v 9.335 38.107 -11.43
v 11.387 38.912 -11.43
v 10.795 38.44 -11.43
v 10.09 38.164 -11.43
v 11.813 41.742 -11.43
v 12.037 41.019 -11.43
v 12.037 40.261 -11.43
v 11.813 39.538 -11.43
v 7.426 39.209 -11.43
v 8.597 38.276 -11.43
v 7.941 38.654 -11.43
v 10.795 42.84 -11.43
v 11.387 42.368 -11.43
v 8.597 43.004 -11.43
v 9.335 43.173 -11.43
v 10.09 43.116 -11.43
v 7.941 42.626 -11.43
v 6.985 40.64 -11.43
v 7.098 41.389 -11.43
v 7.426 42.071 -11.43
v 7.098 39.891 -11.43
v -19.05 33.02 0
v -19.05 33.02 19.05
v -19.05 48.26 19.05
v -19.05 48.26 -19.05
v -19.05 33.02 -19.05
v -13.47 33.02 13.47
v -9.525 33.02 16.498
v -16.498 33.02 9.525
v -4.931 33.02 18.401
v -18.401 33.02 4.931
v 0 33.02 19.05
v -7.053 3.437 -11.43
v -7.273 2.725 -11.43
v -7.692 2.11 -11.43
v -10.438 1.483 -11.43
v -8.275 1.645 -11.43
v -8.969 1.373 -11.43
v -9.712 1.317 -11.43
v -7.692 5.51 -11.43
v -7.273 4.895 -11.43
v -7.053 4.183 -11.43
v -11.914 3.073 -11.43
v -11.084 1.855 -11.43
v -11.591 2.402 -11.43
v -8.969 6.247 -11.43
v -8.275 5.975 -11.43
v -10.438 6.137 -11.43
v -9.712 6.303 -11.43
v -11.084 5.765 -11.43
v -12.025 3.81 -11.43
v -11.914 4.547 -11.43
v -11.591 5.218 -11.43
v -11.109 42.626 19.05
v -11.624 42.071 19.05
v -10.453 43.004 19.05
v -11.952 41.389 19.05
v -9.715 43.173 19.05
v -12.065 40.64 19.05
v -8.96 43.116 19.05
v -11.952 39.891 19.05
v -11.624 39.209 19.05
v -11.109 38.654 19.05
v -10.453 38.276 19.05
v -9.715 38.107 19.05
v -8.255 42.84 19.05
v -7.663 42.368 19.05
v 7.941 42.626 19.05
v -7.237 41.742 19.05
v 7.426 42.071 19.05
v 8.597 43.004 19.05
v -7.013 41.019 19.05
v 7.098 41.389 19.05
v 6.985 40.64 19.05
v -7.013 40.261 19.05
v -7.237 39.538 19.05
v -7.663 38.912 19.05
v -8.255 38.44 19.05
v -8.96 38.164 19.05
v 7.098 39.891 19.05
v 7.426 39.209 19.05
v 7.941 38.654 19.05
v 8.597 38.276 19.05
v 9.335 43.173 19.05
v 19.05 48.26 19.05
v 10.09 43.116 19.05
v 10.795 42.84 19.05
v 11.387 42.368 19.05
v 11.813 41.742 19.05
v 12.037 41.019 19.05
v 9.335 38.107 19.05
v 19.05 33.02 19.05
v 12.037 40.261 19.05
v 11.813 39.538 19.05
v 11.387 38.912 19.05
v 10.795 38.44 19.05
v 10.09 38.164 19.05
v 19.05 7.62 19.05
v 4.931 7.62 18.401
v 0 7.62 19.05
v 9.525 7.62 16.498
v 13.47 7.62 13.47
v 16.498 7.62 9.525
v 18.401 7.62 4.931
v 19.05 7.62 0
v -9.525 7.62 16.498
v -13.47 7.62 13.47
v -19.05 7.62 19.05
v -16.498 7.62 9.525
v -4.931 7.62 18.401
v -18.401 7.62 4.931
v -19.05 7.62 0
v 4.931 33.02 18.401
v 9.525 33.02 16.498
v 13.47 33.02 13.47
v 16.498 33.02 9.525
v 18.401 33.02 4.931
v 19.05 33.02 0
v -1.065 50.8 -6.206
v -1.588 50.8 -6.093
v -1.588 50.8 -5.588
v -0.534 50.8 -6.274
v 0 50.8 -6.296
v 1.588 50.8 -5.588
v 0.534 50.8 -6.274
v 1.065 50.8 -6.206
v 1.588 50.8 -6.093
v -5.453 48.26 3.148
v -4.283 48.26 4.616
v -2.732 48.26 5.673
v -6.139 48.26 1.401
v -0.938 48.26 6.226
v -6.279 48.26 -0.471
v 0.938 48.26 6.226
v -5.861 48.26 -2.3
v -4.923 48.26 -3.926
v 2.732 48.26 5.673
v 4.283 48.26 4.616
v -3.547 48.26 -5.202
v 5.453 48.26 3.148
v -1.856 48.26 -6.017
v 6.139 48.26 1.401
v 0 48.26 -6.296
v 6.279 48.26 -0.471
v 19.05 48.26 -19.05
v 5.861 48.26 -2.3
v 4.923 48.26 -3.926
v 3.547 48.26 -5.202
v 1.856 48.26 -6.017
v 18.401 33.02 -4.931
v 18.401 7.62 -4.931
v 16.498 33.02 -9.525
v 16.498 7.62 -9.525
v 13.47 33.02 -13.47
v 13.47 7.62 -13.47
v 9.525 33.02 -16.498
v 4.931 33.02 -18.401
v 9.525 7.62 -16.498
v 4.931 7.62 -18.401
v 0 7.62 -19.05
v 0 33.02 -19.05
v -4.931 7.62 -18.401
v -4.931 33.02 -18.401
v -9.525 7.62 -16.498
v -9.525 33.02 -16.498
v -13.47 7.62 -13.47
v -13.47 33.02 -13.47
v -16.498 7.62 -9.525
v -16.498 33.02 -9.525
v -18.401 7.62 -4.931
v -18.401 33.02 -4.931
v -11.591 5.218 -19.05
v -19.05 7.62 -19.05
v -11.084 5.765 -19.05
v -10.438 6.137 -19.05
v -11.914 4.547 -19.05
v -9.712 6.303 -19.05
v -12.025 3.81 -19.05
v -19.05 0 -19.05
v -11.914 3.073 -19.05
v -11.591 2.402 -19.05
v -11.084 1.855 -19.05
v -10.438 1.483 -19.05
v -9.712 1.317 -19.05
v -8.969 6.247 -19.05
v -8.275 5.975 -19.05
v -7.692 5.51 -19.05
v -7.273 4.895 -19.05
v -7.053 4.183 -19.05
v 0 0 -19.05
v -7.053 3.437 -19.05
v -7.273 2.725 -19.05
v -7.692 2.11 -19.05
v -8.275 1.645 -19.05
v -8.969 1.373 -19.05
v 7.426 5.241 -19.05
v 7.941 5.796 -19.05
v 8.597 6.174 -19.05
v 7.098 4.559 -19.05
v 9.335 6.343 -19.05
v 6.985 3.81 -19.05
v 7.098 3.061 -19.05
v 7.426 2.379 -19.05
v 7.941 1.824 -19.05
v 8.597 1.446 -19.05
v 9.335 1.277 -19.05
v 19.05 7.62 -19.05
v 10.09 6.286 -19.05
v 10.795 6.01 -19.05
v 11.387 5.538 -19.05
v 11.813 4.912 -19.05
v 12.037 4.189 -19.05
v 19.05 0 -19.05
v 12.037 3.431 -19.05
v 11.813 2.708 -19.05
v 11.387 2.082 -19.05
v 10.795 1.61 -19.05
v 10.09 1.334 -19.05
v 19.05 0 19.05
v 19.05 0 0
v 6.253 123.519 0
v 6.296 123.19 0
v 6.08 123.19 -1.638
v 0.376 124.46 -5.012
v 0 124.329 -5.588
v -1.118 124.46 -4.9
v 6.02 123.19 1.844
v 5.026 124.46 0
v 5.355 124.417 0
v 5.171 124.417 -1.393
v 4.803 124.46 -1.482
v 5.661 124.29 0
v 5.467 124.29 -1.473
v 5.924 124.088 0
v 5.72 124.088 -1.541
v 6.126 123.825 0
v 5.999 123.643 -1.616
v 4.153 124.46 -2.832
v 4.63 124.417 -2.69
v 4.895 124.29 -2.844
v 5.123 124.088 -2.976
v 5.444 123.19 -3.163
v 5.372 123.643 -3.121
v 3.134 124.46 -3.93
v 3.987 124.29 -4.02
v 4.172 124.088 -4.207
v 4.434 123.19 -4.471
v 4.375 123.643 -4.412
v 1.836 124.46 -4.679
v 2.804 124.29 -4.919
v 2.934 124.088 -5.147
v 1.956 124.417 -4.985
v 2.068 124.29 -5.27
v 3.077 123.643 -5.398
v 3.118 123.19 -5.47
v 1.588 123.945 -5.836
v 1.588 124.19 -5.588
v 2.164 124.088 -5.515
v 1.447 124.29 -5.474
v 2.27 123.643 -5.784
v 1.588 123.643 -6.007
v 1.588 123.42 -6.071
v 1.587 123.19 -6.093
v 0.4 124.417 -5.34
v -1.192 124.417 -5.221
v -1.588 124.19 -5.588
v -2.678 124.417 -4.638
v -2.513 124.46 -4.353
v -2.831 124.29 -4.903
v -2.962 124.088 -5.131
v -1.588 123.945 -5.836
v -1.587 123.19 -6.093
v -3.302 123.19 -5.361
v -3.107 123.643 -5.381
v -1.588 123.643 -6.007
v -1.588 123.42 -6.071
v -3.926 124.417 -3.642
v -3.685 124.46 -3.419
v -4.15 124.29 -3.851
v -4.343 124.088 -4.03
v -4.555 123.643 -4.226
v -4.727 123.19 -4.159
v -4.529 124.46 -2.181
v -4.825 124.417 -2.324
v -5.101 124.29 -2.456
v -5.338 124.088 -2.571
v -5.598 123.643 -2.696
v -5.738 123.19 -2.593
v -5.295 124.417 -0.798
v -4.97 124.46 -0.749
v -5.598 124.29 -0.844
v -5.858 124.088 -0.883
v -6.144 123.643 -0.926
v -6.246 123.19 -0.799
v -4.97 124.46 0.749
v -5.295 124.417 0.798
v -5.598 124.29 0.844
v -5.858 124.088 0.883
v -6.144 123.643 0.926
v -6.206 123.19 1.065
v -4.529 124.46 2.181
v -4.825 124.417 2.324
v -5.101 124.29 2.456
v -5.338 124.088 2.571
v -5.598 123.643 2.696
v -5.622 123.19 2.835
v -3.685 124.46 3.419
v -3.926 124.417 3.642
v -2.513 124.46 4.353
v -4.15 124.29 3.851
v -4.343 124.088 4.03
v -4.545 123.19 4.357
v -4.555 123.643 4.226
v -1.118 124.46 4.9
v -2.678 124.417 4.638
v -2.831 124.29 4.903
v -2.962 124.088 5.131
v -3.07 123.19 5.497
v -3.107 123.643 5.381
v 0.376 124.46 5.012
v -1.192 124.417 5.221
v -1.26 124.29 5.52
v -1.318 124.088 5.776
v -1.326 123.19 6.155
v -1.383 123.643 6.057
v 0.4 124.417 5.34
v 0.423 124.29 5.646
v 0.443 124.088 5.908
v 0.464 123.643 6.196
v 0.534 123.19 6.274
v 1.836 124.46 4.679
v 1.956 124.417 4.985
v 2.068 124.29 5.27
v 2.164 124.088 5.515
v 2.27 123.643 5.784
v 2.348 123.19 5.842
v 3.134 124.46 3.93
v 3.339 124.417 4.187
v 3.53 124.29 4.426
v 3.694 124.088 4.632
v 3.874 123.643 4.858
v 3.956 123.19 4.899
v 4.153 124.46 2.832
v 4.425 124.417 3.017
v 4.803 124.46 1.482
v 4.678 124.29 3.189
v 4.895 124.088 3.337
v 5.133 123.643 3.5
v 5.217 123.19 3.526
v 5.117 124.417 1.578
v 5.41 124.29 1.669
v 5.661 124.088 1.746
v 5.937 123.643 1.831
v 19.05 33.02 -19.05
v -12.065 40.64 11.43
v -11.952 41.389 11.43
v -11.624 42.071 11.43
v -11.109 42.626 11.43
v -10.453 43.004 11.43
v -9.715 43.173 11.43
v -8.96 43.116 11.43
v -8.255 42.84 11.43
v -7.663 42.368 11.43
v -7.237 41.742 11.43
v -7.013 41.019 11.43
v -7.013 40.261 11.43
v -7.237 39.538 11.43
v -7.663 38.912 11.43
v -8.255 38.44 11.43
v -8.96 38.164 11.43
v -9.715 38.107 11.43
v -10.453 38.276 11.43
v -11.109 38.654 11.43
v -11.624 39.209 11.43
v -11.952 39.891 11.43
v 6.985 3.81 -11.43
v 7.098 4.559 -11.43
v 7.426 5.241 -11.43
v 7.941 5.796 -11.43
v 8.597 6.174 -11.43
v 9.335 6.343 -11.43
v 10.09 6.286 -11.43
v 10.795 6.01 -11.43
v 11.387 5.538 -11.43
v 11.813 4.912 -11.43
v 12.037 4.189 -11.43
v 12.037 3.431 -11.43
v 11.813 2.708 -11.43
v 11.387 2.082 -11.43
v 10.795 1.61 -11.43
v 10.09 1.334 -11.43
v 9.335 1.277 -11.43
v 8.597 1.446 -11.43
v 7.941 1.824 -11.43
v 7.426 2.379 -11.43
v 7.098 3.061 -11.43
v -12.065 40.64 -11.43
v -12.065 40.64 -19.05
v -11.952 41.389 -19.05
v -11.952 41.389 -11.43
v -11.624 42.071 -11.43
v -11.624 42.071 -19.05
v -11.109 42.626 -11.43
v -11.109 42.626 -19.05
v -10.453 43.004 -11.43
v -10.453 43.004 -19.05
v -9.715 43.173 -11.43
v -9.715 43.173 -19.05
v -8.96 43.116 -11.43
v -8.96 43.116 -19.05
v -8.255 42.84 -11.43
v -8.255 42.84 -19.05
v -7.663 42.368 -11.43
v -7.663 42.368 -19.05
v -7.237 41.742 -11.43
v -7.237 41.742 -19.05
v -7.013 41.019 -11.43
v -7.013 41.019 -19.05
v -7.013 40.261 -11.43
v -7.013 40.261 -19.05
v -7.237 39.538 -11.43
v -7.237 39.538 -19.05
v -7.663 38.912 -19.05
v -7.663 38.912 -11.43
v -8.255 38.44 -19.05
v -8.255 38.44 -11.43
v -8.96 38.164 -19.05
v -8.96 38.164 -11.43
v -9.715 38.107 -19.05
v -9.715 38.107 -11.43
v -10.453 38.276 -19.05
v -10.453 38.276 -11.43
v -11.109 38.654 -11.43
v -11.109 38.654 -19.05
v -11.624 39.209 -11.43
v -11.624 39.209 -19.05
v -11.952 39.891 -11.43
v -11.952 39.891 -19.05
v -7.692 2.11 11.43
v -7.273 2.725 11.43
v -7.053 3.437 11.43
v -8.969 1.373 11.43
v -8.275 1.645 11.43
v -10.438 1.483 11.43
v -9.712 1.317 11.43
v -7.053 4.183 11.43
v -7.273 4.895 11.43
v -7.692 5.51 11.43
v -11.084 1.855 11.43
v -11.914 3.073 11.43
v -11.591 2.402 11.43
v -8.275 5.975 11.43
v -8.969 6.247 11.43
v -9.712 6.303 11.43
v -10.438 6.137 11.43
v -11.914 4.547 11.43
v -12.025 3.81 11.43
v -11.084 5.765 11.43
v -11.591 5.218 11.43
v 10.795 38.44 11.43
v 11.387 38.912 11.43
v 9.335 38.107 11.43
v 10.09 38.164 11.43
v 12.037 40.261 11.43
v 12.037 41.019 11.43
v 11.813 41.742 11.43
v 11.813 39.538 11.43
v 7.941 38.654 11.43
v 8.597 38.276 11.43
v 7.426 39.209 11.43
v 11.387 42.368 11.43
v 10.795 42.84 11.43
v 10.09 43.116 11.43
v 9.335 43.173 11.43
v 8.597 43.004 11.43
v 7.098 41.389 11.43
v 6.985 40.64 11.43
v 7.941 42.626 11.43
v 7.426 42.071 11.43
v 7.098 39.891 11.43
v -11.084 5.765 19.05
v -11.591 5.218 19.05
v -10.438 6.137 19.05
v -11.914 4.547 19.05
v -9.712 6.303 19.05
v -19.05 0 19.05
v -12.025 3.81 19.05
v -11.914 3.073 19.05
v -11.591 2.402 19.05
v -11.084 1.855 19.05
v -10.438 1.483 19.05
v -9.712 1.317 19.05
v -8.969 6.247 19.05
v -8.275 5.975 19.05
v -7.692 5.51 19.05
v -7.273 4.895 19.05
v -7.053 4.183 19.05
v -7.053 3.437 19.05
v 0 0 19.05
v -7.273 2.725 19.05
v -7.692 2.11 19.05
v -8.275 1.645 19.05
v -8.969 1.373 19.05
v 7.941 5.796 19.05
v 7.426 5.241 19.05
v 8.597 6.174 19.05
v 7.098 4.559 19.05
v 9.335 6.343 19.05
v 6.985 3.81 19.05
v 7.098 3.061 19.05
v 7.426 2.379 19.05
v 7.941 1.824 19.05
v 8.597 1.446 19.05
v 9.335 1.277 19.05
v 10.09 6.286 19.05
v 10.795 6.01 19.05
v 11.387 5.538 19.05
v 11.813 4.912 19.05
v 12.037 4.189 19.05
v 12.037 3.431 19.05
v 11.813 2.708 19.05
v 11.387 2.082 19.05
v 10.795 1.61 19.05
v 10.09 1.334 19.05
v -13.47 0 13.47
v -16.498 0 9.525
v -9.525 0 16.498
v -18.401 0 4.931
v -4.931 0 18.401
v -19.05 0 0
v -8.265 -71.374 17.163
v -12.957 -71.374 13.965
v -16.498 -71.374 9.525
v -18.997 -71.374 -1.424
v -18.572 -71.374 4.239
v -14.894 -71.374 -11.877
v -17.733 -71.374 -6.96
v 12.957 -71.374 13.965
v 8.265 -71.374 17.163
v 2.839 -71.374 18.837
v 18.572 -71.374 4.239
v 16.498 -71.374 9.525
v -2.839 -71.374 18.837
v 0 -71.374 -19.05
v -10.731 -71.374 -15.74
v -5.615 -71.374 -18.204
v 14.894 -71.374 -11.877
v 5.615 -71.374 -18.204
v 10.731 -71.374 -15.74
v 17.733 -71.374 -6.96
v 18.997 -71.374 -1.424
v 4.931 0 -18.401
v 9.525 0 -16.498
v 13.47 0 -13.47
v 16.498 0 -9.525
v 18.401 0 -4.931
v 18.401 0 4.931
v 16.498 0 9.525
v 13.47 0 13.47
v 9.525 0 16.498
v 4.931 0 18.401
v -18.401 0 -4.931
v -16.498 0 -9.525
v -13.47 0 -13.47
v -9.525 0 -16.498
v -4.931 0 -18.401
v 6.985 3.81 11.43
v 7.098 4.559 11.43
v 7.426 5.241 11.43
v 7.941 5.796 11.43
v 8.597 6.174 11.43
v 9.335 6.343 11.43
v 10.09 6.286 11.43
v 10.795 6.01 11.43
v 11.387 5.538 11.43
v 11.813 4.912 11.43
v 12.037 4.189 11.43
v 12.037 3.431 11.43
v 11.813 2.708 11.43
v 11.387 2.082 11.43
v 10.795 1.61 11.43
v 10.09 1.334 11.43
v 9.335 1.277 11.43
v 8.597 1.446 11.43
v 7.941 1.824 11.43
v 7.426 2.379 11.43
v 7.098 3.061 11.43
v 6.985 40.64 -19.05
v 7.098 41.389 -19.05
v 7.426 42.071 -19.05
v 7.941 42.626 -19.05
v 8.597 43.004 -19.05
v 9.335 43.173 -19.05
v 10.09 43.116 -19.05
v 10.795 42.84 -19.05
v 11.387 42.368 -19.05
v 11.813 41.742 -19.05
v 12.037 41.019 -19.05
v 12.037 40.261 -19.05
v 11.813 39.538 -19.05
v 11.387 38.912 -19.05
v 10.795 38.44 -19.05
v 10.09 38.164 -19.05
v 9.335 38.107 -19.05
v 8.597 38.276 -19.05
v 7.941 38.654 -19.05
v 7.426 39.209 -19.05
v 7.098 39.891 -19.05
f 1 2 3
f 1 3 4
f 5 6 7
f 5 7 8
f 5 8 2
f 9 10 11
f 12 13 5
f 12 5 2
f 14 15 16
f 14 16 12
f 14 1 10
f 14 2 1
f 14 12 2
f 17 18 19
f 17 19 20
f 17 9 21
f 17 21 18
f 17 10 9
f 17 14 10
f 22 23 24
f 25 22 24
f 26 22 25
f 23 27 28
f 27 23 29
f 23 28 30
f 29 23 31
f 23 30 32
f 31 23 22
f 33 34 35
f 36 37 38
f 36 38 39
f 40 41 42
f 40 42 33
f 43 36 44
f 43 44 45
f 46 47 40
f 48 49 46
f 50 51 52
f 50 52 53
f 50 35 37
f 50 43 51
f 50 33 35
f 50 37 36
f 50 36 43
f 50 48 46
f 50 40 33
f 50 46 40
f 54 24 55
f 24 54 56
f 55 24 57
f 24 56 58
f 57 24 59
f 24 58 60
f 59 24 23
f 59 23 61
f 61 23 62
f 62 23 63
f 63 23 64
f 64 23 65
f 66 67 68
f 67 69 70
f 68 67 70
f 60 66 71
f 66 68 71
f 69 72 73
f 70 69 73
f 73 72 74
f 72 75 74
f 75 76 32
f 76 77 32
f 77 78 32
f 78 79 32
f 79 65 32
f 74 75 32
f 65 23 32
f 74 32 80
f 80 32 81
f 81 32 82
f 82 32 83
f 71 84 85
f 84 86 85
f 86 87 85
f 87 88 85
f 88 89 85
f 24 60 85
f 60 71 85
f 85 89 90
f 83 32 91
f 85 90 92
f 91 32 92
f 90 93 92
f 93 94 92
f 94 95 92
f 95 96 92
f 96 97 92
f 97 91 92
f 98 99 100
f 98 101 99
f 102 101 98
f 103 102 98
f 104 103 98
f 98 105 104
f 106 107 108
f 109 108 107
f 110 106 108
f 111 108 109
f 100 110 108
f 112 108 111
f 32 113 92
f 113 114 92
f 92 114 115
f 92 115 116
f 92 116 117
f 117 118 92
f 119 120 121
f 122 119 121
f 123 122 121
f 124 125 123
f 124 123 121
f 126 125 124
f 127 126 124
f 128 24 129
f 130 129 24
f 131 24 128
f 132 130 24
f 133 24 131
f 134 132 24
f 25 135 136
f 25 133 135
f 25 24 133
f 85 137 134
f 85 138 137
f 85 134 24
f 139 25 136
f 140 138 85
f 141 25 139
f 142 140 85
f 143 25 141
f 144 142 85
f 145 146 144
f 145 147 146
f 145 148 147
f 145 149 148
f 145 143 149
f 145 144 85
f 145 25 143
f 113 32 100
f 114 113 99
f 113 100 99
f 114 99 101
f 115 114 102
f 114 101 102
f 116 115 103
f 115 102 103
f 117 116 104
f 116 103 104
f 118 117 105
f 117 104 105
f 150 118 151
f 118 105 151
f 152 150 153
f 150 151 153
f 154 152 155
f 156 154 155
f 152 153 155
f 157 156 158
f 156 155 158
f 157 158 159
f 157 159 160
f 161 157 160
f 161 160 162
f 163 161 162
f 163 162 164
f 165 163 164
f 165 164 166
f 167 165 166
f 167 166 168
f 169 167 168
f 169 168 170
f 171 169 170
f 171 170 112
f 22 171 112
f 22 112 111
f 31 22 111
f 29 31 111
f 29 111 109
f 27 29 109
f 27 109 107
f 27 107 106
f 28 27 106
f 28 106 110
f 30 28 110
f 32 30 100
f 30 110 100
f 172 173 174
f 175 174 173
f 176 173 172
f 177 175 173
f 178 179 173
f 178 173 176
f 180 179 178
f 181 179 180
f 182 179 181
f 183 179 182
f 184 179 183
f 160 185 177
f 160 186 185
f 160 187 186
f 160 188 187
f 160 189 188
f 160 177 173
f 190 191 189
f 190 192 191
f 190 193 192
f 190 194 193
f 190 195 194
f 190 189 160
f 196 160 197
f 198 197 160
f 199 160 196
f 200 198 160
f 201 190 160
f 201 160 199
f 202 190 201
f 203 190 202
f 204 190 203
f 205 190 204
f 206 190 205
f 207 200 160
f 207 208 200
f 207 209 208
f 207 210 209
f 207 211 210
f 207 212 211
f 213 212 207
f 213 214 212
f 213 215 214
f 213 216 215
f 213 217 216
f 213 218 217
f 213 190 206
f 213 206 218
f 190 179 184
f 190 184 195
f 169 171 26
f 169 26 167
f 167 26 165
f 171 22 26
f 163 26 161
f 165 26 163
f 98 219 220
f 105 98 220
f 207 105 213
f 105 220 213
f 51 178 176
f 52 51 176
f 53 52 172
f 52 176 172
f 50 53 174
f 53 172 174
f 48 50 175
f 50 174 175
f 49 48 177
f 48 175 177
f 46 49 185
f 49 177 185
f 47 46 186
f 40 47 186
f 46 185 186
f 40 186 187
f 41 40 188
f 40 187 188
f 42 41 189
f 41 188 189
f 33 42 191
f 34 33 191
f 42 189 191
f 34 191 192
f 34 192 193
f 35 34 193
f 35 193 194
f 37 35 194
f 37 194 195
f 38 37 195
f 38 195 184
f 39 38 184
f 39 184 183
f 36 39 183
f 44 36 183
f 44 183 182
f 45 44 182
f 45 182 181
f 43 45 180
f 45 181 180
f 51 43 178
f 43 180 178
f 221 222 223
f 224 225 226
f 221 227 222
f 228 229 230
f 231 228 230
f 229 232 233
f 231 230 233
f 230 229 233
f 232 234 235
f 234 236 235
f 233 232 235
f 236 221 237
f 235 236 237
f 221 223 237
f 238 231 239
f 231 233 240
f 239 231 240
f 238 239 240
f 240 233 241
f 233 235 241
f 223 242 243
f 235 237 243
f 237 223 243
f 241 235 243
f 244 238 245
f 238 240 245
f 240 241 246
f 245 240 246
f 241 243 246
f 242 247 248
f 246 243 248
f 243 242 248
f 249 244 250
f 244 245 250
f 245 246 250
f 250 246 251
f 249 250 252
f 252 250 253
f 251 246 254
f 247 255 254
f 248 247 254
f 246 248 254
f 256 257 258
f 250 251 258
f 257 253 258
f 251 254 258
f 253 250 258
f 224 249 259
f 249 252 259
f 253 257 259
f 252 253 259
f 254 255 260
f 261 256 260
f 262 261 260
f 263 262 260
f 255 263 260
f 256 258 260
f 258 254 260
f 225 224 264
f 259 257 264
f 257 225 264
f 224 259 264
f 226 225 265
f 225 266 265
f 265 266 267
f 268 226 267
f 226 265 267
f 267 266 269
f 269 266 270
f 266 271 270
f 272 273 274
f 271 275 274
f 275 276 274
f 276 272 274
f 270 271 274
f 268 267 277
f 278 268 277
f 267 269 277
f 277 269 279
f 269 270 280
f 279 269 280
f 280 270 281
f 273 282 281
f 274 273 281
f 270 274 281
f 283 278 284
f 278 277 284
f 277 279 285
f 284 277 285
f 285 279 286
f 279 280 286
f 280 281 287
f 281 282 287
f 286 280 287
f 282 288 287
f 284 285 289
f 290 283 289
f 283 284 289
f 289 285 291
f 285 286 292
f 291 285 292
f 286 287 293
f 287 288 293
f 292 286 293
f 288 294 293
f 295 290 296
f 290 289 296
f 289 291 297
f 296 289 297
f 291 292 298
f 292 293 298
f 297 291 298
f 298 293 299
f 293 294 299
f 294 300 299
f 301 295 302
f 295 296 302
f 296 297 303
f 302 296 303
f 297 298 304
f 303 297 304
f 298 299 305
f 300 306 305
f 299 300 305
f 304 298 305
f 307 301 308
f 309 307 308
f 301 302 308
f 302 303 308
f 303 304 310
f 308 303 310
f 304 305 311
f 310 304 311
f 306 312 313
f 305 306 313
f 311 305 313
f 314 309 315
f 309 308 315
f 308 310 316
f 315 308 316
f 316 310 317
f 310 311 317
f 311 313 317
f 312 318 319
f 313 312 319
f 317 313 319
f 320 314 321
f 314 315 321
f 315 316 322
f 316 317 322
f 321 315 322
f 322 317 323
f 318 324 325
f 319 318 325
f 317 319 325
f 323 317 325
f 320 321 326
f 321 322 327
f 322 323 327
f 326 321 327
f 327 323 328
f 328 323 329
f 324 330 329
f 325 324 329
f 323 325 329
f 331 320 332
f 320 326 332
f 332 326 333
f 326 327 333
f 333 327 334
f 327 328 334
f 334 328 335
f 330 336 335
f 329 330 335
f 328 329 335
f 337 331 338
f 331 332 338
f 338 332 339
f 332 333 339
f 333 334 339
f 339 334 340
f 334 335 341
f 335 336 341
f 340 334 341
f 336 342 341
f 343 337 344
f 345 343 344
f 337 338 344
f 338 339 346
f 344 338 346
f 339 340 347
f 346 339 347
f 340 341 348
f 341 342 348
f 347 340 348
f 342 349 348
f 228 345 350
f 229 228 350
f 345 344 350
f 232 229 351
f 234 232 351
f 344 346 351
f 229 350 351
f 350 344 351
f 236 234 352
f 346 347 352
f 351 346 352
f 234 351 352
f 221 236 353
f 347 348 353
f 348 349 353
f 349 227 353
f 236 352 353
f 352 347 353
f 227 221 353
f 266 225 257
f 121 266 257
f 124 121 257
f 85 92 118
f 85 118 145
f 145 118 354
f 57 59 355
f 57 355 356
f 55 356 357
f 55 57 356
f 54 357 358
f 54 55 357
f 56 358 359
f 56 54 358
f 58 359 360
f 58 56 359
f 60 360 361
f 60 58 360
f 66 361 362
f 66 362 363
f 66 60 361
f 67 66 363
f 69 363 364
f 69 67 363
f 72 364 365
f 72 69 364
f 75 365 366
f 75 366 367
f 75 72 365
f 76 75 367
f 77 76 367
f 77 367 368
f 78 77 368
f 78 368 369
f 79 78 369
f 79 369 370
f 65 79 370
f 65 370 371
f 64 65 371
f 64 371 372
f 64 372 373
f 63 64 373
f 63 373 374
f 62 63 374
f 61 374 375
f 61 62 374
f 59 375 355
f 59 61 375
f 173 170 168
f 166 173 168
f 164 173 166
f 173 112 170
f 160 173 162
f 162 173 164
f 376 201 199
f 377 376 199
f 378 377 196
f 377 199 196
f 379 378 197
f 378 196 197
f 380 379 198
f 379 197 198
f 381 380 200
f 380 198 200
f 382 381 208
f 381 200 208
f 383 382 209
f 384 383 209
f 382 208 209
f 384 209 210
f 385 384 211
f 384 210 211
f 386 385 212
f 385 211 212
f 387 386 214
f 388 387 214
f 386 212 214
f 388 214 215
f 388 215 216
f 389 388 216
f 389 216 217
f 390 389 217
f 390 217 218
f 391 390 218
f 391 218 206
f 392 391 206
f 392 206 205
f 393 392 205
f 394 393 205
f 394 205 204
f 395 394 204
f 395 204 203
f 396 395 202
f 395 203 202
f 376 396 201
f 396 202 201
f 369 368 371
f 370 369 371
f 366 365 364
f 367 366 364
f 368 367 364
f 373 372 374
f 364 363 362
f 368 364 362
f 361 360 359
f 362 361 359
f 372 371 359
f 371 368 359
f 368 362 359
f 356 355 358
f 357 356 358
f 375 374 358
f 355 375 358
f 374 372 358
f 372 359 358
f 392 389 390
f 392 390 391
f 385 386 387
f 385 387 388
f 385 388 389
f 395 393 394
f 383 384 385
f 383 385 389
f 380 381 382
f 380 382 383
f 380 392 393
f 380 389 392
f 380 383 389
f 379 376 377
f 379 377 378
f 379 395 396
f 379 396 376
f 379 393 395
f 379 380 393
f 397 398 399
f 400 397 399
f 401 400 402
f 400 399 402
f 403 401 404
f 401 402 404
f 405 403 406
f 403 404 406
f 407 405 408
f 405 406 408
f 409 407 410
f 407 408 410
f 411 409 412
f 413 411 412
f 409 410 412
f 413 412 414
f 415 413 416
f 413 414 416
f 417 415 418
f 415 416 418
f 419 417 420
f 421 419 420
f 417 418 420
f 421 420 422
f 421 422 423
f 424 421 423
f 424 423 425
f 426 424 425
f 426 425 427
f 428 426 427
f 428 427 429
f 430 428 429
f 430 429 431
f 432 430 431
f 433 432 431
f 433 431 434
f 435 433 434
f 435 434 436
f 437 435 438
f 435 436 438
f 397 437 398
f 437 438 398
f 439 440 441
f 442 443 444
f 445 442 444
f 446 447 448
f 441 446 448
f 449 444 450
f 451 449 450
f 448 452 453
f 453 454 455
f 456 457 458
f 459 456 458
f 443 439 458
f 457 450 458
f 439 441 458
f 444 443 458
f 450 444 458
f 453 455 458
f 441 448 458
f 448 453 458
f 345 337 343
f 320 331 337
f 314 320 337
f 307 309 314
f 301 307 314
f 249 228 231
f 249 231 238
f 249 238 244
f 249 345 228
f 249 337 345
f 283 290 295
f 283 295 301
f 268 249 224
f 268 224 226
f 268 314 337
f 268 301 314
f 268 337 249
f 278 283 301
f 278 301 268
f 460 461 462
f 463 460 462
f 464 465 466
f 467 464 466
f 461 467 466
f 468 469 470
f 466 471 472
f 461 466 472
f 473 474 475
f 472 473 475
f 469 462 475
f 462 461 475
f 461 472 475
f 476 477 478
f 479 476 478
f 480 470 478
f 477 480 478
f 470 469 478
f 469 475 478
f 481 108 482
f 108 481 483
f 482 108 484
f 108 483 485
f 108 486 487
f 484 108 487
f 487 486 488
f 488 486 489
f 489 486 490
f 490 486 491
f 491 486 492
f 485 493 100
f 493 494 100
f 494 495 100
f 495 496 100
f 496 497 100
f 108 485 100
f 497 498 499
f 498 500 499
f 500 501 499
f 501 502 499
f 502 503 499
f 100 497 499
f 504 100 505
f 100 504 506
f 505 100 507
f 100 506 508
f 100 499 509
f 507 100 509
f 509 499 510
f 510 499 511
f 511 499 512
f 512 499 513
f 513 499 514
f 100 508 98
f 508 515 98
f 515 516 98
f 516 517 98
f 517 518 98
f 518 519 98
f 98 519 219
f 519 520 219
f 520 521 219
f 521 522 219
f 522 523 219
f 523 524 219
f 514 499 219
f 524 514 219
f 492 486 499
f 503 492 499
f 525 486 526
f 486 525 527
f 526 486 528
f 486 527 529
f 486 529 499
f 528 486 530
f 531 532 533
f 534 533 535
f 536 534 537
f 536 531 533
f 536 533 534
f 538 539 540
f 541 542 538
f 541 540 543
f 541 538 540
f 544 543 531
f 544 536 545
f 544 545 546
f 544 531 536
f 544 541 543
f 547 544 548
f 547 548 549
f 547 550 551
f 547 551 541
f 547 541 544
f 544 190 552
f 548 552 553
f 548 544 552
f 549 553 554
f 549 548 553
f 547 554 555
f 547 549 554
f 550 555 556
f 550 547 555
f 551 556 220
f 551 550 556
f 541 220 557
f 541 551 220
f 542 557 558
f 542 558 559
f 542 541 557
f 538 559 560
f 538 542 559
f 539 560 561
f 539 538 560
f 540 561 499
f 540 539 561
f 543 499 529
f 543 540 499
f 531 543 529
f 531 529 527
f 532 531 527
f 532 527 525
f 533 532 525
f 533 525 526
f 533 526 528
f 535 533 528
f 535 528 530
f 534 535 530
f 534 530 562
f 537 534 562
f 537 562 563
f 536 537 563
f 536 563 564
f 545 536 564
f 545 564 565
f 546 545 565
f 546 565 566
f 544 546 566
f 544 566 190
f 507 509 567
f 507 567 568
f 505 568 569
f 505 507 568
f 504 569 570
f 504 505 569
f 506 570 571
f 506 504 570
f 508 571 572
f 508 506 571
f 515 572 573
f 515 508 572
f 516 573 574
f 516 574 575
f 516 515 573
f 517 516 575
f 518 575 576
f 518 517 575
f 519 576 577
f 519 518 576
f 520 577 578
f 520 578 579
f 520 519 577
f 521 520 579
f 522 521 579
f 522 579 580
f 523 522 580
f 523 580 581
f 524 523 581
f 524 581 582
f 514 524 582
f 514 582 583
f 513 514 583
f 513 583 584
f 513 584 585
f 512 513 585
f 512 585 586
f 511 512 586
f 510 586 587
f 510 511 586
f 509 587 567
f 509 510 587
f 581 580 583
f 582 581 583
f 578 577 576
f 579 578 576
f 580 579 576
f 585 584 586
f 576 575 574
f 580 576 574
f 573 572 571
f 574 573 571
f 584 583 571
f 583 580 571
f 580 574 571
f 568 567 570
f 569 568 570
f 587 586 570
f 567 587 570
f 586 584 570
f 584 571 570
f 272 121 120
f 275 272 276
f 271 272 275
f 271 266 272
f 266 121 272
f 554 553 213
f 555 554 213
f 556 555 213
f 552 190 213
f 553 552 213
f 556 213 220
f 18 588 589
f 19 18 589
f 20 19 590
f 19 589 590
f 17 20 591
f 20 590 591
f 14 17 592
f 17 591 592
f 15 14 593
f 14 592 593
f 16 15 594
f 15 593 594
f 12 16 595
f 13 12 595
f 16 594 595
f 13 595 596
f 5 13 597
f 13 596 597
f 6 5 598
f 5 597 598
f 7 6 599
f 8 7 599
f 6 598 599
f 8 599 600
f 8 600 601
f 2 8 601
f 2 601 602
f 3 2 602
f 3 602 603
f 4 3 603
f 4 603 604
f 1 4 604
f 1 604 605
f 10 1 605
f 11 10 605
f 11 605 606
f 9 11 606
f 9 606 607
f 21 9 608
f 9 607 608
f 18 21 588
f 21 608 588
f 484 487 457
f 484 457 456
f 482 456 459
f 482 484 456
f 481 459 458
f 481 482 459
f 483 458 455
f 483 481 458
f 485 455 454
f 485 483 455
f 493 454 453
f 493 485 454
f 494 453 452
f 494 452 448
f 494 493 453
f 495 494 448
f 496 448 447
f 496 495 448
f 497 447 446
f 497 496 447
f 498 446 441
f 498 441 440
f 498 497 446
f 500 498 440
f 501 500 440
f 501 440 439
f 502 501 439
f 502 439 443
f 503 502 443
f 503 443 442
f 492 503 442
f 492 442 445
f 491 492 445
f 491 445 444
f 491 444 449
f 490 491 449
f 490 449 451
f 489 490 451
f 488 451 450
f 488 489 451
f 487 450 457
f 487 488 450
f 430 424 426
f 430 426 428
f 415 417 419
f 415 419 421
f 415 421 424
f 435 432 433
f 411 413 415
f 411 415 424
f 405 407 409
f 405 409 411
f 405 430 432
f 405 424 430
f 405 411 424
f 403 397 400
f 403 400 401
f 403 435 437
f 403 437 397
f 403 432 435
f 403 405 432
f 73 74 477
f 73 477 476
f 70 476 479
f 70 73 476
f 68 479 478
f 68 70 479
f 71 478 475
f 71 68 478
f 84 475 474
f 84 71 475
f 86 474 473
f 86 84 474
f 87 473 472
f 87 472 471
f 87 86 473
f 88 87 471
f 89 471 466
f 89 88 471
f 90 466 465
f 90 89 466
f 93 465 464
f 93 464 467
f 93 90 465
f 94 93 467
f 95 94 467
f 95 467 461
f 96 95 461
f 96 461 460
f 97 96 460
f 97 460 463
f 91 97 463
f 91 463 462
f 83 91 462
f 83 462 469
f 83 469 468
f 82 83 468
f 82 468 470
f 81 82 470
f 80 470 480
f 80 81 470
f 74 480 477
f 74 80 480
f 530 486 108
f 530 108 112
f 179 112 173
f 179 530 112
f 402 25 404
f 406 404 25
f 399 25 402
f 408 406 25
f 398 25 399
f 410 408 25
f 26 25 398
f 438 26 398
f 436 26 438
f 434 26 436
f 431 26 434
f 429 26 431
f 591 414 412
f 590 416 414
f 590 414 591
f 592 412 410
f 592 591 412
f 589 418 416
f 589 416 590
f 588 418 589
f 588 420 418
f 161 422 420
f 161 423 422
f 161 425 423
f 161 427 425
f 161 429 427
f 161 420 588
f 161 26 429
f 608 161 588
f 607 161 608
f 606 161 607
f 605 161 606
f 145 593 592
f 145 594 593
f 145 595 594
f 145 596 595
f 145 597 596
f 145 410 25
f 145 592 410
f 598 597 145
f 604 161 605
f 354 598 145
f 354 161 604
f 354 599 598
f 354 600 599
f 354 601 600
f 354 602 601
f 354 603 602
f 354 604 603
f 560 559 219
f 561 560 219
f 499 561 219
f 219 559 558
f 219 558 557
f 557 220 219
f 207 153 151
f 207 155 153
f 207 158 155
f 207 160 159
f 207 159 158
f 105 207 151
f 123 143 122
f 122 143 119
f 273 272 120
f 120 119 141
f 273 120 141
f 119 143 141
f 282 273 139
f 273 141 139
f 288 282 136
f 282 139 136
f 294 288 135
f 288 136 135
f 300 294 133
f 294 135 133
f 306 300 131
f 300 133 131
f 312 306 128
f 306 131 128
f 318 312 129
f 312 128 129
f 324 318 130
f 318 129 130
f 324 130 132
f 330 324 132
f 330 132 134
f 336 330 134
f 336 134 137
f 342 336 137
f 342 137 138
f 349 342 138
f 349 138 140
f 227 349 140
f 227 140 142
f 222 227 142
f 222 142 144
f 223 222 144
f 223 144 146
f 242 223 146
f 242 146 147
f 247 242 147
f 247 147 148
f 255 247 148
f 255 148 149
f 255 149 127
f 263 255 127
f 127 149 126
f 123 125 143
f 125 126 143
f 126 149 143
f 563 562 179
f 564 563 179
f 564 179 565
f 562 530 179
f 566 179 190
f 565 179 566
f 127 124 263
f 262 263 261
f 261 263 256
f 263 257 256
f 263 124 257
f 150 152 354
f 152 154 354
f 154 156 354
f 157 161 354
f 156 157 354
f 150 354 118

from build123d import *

# Parameters (mm, degrees)
SKETCH1_W           = 38.1
SKETCH1_H           = 38.1
BOSS_EXTRUDE1_DEPTH = 7.62
SKETCH2_R           = 19.05
BOSS_EXTRUDE2_DEPTH = 25.4
SKETCH3_W           = 38.1
SKETCH3_H           = 38.1
BOSS_EXTRUDE3_DEPTH = 15.24
SKETCH4_R           = 6.296459426
BOSS_EXTRUDE4_DEPTH = 76.2
SKETCH5_W           = 3.175
SKETCH5_H           = 1.58699954
CUT_EXTRUDE1_DEPTH  = 73.66
SKETCH6_R           = 2.54
SKETCH6_R_2         = 2.5
CUT_EXTRUDE2_DEPTH  = 7.62
BOSS_EXTRUDE5_START = 71.374
SKETCH7_R           = 19.05
BOSS_EXTRUDE5_DEPTH = 71.374


with BuildPart() as part:
    # Sketch1 → Boss-Extrude1 (new body)
    with BuildSketch(Plane(origin=(0, 0, 0), x_dir=(1, 0, 0), z_dir=(0, 1, 0))):
        Rectangle(SKETCH1_W, SKETCH1_H)
    extrude(amount=BOSS_EXTRUDE1_DEPTH)

    # Sketch2 → Boss-Extrude2 (add)
    with BuildSketch(Plane(origin=(0, 7.62, 0), x_dir=(1, 0, 0), z_dir=(0, 1, 0))):
        with Locations(Location((0, 0, 0), (0, 0, 270))):
            Circle(SKETCH2_R)
    extrude(amount=BOSS_EXTRUDE2_DEPTH)

    # Sketch3 → Boss-Extrude3 (add)
    with BuildSketch(Plane(origin=(0, 33.02, 0), x_dir=(1, 0, 0), z_dir=(0, 1, 0))):
        Rectangle(SKETCH3_W, SKETCH3_H)
    extrude(amount=BOSS_EXTRUDE3_DEPTH)

    # Sketch4 → Boss-Extrude4 (add)
    with BuildSketch(Plane(origin=(0, 48.26, 0), x_dir=(1, 0, 0), z_dir=(0, 1, 0))):
        with Locations(Location((0, 0, 0), (0, 0, 90))):
            Circle(SKETCH4_R)
    extrude(amount=BOSS_EXTRUDE4_DEPTH)

    # Sketch5 → Cut-Extrude1 (cut)
    with BuildSketch(Plane(origin=(0, 124.46, 0), x_dir=(1, 0, 0), z_dir=(0, 1, 0))):
        with Locations((0, 6.38149977)):
            Rectangle(SKETCH5_W, SKETCH5_H)
    extrude(amount=-CUT_EXTRUDE1_DEPTH, mode=Mode.SUBTRACT)

    # Fillet1: read off the stored shape, not the designer's step
    # Fillet1 outline → Fillet1 (revolve, cut)
    with BuildSketch(Plane.XY):
        with BuildLine():
            ThreePointArc((5.026459426, 124.46), (5.924485038, 124.088025612), (6.296459426, 123.19))
            Line((6.296459426, 123.19), (6.296459426, 124.46))
            Line((6.296459426, 124.46), (5.026459426, 124.46))
        make_face()
    revolve(axis=Axis((0, 0, 0), (0, 1, 0)), mode=Mode.SUBTRACT)

    # Sketch6 → Cut-Extrude2 (cut)
    with BuildSketch(Plane(origin=(0, 0, -19.05), x_dir=(-1, 0, 0), z_dir=(0, 0, -1))):
        with Locations((-9.525, 3.81)):
            Circle(SKETCH6_R)
        with Locations((-9.525, 40.64)):
            Circle(SKETCH6_R)
        with Locations((9.525, 40.64)):
            Circle(SKETCH6_R)
        with Locations((9.525, 3.81)):
            Circle(SKETCH6_R_2)
    cut_extrude2 = extrude(amount=-CUT_EXTRUDE2_DEPTH, mode=Mode.SUBTRACT)

    # Mirror1: Cut-Extrude2 across plane
    add(cut_extrude2.mirror(Plane.XY), mode=Mode.SUBTRACT)

    # Sketch7 → Boss-Extrude5 (add)
    with BuildSketch(Plane.XZ.offset(BOSS_EXTRUDE5_START)):
        with Locations(Location((0, 0, 0), (0, 0, 270))):
            Circle(SKETCH7_R)
    extrude(amount=-BOSS_EXTRUDE5_DEPTH)


solid = part.part
